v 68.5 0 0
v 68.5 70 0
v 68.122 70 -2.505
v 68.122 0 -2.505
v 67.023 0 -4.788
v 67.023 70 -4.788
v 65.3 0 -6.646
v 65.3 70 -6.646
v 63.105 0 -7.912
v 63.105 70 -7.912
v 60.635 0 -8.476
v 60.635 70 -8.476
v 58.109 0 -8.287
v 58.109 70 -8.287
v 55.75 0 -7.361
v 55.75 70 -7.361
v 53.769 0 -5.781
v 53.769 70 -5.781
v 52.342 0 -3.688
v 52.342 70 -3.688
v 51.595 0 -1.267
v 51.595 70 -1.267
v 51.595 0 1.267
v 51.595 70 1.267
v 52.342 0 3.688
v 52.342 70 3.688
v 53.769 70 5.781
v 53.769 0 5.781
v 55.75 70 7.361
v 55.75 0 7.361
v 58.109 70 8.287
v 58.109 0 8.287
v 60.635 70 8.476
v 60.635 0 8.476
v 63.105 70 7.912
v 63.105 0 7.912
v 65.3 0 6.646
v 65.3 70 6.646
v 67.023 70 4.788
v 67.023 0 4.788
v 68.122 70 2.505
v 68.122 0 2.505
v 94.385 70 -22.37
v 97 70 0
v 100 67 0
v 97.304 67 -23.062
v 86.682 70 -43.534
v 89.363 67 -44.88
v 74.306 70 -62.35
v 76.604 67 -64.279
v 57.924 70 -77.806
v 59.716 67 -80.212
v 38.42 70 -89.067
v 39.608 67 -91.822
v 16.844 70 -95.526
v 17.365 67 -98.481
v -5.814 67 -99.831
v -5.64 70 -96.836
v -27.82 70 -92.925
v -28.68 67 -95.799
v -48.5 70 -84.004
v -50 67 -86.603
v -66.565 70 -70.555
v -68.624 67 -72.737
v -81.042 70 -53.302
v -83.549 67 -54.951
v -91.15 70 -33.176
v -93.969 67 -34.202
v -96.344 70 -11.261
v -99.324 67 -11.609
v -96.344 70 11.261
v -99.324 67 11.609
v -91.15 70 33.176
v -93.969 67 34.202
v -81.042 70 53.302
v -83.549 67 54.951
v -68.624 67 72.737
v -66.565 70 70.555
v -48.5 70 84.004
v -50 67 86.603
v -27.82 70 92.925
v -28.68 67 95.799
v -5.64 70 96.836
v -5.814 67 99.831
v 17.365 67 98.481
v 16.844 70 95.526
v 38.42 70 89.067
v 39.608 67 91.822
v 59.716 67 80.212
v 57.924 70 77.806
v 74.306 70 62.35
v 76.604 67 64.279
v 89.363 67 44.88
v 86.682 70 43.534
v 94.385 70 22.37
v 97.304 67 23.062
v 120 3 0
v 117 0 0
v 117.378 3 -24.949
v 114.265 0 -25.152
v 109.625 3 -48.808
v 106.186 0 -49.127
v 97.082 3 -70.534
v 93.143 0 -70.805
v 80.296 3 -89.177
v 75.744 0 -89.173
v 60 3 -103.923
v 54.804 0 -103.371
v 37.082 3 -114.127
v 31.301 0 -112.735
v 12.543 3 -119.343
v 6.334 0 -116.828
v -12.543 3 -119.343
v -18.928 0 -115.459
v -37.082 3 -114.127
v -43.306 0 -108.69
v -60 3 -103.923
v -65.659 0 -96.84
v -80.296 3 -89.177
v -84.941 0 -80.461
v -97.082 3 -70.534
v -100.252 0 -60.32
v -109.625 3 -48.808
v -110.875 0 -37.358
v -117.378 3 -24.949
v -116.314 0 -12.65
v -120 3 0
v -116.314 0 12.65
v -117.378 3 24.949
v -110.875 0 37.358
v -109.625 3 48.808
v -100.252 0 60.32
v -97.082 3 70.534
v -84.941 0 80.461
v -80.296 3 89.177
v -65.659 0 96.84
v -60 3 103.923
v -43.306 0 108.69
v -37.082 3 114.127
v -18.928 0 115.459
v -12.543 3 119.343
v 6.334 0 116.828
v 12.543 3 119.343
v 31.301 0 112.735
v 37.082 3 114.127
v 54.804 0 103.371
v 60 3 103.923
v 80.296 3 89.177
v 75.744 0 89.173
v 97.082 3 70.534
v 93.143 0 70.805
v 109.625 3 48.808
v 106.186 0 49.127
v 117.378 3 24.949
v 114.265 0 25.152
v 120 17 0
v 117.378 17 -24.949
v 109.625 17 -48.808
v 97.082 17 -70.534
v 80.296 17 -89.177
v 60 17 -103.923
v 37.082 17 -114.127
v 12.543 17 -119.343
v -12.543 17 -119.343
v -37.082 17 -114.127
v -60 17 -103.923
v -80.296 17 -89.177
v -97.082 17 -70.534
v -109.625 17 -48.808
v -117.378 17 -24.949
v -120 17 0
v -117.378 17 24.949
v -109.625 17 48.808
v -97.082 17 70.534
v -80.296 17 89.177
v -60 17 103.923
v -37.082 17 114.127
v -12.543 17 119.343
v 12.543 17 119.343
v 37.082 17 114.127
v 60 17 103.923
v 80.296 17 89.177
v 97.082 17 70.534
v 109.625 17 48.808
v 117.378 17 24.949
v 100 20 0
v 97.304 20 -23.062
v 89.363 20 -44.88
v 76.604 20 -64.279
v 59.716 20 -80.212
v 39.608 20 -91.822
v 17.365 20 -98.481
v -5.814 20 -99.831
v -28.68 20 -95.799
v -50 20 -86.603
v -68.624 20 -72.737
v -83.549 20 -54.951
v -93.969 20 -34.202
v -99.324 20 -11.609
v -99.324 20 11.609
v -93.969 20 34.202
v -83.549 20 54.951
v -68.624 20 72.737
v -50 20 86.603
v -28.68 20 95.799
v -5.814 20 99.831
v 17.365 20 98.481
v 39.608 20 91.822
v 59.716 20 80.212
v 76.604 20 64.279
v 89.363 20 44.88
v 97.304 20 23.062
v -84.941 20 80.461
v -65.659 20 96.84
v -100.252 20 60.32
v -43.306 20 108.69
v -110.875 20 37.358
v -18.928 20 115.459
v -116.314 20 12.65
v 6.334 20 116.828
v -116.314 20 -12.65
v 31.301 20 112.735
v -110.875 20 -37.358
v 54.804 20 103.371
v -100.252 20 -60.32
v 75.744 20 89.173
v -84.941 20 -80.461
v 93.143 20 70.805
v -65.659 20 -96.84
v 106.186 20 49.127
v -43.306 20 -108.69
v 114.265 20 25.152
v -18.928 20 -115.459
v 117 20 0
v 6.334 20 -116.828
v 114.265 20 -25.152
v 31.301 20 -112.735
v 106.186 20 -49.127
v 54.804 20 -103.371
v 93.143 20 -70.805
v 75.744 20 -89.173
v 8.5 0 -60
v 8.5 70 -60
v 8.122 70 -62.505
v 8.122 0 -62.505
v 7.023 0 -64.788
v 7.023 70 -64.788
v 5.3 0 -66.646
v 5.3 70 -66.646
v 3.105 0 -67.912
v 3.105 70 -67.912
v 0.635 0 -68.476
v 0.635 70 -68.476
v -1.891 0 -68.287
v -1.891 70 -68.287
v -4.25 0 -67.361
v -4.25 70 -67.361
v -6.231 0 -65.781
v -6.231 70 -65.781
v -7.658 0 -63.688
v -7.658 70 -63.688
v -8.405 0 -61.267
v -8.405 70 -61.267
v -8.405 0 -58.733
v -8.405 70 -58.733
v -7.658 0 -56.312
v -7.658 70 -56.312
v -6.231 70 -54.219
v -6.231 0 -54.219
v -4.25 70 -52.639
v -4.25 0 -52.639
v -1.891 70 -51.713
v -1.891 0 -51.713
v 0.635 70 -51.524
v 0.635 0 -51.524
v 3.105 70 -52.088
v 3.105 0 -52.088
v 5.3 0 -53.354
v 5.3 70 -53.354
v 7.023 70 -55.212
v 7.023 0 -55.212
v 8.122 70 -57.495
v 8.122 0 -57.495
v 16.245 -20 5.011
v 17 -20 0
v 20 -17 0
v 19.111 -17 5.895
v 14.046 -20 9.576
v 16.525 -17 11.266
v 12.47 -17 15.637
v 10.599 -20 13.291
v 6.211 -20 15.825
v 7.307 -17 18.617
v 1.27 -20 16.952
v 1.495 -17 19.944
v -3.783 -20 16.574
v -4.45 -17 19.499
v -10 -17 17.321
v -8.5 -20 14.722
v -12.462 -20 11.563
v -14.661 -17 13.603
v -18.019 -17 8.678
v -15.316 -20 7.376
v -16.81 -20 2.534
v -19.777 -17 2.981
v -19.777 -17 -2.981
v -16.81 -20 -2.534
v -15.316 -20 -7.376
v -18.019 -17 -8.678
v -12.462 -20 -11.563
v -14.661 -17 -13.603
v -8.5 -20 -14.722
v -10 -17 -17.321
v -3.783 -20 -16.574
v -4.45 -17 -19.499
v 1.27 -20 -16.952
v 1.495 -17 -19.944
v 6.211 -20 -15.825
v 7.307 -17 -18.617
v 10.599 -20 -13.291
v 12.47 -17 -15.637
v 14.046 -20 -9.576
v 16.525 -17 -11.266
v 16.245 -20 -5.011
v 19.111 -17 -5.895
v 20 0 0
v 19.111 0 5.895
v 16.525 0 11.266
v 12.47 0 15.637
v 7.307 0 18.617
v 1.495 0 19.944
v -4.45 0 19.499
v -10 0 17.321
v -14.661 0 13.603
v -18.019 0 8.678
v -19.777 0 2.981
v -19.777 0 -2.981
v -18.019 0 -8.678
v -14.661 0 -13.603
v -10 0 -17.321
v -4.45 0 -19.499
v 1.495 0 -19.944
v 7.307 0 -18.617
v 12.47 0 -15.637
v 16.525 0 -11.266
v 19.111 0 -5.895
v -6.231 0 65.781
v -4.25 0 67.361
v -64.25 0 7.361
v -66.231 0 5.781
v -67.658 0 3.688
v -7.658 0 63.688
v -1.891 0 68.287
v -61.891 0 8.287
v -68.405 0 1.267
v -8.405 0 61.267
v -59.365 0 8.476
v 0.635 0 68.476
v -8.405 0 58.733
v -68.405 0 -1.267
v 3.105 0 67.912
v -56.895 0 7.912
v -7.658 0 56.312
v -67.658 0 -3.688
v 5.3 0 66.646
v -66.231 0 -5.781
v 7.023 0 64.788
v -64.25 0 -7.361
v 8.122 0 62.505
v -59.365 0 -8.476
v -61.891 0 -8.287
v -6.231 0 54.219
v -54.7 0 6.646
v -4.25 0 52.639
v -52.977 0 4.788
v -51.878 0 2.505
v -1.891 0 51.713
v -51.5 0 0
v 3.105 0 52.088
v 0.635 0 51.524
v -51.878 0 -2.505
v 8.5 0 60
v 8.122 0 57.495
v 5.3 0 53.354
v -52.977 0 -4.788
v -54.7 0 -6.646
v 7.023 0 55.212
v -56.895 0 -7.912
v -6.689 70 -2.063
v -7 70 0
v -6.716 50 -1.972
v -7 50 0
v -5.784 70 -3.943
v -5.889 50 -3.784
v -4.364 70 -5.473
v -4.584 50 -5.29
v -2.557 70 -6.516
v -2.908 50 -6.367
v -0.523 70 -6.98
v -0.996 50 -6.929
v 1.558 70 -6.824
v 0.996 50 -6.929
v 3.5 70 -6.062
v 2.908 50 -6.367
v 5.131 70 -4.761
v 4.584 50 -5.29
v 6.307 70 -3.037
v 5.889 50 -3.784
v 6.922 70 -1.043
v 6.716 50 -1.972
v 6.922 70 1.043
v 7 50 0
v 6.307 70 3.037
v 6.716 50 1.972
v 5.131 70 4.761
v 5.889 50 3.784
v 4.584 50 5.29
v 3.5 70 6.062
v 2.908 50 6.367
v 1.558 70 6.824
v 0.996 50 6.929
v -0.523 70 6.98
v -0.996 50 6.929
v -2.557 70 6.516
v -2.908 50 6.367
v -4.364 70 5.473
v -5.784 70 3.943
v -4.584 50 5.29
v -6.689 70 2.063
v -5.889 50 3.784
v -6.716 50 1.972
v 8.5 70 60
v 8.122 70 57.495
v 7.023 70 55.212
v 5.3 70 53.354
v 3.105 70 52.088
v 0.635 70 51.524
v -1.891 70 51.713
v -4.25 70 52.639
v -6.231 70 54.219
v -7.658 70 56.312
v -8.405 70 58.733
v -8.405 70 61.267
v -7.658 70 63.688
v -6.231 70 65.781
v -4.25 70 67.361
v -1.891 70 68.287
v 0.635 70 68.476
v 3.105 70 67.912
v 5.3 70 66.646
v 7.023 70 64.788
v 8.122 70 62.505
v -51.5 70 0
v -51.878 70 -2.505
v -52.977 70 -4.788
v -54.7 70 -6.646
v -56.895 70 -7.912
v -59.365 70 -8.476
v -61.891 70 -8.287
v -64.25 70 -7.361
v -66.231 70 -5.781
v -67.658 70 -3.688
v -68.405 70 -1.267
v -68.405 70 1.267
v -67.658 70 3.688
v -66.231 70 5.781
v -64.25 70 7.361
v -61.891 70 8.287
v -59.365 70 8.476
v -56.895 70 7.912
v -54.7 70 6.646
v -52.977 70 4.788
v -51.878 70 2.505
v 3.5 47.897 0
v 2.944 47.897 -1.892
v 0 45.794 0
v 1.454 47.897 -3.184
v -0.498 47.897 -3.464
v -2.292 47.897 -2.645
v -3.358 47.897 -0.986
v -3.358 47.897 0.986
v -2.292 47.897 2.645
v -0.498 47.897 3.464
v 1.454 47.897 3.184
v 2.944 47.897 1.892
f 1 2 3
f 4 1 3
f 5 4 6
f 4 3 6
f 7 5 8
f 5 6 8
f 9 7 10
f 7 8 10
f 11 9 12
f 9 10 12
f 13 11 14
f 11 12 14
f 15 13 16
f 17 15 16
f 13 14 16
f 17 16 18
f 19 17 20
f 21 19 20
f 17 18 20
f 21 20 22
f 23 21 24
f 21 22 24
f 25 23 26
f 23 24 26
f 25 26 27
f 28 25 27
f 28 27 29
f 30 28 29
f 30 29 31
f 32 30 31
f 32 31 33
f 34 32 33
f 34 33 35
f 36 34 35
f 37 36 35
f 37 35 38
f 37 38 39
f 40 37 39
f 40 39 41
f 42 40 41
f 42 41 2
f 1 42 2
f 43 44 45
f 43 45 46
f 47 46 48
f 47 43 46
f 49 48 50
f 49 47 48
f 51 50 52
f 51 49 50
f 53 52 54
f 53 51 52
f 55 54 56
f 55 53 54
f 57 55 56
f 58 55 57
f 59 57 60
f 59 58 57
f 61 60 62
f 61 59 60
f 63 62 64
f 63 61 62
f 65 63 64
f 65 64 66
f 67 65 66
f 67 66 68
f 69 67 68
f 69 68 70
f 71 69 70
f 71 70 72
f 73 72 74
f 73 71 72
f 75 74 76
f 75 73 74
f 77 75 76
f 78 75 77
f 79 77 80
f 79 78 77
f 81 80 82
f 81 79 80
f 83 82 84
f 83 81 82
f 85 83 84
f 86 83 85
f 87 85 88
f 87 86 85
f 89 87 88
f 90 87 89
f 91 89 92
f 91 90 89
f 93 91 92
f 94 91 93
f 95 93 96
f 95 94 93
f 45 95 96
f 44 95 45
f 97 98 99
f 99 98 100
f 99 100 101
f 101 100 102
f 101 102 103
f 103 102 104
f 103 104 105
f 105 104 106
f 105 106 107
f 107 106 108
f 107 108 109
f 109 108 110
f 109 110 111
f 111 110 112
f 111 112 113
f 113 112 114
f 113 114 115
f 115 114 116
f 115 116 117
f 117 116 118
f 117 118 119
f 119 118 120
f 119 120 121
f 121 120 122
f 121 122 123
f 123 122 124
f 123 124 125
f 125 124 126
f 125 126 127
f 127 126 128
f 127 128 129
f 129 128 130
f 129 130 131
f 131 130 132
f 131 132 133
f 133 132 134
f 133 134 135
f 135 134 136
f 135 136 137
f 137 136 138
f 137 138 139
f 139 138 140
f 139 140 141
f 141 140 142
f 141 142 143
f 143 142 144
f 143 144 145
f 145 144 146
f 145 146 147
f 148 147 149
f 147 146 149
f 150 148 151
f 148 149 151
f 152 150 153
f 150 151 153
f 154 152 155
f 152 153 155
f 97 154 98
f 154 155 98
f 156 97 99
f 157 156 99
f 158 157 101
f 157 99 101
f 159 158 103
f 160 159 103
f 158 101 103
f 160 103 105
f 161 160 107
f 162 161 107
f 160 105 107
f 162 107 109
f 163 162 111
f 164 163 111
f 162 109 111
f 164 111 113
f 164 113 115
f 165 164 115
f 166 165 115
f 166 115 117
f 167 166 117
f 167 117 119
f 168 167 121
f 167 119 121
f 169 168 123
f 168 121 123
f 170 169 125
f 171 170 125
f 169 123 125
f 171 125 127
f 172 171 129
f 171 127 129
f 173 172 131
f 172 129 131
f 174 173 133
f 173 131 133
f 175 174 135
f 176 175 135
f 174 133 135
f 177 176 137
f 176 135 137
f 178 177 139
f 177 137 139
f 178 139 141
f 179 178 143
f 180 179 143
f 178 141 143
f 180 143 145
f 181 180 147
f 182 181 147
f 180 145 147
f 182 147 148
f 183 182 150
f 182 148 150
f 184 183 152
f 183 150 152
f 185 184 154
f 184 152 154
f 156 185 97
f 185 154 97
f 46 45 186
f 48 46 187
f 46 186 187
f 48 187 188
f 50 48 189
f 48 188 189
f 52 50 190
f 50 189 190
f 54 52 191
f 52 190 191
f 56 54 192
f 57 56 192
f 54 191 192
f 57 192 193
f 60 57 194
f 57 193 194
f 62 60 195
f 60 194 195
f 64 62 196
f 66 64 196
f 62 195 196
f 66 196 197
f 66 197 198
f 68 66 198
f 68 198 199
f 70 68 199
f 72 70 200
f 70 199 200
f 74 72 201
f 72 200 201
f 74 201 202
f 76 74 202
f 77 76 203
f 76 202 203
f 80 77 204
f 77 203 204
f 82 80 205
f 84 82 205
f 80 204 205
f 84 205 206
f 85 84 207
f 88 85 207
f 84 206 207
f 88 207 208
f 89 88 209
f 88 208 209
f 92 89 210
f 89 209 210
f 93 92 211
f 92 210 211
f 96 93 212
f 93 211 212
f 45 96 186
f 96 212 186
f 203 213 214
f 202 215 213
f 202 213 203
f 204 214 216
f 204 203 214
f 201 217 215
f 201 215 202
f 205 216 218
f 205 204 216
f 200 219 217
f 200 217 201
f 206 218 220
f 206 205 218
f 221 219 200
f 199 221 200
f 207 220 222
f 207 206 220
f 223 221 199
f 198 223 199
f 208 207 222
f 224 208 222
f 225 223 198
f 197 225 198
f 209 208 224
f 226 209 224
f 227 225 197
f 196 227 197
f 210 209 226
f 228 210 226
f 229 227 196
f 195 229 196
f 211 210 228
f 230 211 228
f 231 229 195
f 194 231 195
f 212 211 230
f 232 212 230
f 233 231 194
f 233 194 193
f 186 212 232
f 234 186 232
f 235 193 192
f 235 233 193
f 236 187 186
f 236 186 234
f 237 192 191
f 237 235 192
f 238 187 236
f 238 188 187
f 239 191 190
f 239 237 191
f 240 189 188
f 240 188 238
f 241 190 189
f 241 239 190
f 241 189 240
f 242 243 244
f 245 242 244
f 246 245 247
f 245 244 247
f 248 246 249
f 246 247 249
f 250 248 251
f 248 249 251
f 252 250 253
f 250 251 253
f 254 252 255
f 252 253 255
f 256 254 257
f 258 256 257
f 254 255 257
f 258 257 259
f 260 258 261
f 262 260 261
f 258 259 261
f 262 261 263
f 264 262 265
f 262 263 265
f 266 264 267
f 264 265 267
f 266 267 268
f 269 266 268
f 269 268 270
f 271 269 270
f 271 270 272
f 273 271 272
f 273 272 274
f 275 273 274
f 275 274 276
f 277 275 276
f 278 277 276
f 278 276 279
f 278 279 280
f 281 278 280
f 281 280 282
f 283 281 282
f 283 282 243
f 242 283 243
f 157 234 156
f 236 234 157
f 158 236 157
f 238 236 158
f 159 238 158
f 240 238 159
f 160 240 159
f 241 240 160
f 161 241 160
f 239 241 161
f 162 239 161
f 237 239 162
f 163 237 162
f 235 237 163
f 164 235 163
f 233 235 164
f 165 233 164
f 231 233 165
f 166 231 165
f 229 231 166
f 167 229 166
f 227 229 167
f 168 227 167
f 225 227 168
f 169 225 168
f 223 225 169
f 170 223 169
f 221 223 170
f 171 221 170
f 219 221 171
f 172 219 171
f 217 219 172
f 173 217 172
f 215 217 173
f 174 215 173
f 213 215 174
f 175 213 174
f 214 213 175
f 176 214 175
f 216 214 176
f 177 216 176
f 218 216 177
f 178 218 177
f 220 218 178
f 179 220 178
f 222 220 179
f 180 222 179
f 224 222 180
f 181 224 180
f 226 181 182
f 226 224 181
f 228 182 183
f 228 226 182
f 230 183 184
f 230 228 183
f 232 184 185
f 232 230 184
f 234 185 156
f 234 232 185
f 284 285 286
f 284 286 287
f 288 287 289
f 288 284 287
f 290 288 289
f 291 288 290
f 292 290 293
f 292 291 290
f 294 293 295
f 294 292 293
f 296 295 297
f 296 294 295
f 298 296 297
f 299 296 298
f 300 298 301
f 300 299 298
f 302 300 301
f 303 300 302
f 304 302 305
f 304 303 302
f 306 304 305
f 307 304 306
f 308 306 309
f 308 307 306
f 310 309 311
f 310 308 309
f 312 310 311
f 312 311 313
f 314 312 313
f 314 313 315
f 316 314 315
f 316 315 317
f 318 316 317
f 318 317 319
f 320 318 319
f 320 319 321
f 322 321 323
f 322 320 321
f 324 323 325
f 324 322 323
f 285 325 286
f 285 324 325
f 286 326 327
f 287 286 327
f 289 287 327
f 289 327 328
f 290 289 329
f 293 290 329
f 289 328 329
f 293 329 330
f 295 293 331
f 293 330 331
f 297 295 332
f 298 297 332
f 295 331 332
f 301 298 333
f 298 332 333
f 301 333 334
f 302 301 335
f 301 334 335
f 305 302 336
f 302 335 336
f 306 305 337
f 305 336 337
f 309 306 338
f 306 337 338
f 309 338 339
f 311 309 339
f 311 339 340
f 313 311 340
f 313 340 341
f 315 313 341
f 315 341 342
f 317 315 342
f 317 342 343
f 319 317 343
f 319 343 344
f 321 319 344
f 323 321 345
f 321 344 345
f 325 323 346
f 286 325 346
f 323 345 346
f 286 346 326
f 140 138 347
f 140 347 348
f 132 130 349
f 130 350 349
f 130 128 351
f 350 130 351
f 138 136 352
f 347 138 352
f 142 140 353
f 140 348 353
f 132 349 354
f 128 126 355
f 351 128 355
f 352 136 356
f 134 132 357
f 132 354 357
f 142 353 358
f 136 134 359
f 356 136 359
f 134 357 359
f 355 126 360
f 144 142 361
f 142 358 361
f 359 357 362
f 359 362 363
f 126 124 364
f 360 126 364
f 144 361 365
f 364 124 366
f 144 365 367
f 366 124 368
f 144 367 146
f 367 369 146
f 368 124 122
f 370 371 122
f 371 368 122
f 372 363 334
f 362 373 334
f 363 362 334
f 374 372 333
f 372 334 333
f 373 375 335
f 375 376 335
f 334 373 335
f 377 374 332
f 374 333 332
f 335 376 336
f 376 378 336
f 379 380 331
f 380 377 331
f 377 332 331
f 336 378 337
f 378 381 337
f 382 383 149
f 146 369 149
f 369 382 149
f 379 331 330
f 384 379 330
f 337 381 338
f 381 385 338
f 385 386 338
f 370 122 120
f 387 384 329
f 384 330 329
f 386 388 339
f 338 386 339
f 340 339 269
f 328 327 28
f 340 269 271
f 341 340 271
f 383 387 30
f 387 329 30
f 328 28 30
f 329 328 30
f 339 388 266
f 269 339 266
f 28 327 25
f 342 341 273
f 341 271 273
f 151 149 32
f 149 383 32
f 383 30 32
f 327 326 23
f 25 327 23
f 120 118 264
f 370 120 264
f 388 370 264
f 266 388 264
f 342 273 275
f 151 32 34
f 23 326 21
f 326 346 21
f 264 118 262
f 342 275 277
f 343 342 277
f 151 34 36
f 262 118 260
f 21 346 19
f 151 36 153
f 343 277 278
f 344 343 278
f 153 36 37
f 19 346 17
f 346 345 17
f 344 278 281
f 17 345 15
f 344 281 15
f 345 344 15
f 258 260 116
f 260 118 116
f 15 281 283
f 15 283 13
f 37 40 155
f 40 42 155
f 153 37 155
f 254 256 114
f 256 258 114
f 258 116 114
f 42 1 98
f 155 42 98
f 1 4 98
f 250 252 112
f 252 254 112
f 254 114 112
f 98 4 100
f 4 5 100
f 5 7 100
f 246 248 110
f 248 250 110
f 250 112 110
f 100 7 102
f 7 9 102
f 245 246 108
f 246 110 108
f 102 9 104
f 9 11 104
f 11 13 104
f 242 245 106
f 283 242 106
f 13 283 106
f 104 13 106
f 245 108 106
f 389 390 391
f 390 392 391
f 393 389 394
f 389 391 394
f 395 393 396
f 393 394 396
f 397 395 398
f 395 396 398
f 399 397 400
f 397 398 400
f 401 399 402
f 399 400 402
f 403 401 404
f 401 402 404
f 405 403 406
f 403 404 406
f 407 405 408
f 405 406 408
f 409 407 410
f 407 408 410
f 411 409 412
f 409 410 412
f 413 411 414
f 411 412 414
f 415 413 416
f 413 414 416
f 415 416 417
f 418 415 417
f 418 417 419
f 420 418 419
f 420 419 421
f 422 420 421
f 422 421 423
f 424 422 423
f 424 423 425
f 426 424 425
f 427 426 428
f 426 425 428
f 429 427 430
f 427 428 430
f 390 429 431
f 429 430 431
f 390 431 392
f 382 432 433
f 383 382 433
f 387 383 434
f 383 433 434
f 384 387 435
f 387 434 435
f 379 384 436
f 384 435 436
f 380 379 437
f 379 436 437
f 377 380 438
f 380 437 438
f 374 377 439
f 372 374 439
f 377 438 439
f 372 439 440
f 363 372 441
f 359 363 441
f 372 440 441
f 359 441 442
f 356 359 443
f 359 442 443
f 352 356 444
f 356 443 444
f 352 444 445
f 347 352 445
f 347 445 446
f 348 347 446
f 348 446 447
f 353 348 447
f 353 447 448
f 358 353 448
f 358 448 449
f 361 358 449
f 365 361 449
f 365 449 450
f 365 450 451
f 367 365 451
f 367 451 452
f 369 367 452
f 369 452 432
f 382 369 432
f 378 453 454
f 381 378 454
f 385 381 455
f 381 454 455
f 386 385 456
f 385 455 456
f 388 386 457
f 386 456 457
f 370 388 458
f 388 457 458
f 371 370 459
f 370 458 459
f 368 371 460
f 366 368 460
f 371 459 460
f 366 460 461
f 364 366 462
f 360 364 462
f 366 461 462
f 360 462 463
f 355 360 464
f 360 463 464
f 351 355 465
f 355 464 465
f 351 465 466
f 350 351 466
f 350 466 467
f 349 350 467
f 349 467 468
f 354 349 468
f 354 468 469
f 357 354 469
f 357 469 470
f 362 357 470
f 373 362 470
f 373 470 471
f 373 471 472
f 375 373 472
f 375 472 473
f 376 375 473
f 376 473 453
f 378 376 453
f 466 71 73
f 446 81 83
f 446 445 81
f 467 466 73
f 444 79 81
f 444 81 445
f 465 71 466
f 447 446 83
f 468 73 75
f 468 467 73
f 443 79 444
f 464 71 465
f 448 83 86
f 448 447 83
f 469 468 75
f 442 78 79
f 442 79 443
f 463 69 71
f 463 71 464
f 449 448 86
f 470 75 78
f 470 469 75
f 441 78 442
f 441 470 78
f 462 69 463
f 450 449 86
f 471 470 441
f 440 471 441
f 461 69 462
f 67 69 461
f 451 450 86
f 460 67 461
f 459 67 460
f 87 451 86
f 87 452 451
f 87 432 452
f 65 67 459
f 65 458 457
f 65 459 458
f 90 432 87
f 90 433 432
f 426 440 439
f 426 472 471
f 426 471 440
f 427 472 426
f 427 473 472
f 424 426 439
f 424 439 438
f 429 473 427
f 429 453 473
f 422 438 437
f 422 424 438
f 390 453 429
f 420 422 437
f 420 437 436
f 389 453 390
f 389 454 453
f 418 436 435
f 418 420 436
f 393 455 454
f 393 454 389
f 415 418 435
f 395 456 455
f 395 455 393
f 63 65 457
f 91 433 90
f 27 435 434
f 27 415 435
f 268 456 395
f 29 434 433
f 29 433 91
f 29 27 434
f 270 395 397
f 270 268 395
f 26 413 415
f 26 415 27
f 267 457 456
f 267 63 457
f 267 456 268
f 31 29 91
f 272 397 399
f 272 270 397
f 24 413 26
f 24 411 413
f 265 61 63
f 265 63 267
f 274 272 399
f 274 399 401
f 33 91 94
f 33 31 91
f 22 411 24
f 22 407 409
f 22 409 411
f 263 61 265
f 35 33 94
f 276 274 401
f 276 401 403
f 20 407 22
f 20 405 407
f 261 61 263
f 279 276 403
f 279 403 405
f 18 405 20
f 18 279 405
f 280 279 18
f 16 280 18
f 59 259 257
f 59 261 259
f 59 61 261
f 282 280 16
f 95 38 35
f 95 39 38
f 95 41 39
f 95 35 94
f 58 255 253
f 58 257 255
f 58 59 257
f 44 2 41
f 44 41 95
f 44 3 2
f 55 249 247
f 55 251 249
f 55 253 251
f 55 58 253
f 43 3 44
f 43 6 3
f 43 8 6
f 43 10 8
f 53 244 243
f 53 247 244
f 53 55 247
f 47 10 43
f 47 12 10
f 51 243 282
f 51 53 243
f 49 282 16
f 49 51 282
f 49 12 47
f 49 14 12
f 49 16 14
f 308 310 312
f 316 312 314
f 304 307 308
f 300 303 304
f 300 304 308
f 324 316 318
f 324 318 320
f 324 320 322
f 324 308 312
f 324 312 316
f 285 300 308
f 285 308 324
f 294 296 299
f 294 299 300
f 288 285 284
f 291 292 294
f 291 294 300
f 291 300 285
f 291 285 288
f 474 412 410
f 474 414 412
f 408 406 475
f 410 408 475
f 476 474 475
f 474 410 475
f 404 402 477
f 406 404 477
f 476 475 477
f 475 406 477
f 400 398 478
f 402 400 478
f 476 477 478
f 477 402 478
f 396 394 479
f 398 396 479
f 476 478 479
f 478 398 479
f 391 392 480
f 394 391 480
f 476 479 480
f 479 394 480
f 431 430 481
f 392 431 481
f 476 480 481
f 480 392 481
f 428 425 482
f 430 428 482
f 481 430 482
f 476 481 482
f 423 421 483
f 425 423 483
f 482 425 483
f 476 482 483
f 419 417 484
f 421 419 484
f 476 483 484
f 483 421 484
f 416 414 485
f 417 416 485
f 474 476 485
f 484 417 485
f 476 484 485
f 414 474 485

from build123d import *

# Parameters (mm, degrees)
SKETCH_1_R             = 120
EXTRUDE_1_DEPTH        = 20
SKETCH_2_R             = 100
EXTRUDE_2_DEPTH        = 50
SKETCH_3_R             = 8.5
CUT_EXTRUDE_1_DEPTH    = 80
SKETCH_4_R             = 20
EXTRUDE_3_DEPTH        = 20
HOLE_WIZARD_M161_D     = 14
HOLE_WIZARD_M161_DEPTH = 20
HOLE_WIZARD_M161_TIP   = 4.206024333
CHAMFER_1_SIZE         = 3
CHAMFER_2_SIZE         = 3


with BuildPart() as part:
    # Эскиз1 → Бобышка-Вытянуть1 (new body)
    with BuildSketch(Plane(origin=(0, 0, 0), x_dir=(1, 0, 0), z_dir=(0, 1, 0))):
        Circle(SKETCH_1_R)
    extrude(amount=EXTRUDE_1_DEPTH)

    # Эскиз2 → Бобышка-Вытянуть2 (add)
    with BuildSketch(Plane(origin=(0, 20, 0), x_dir=(1, 0, 0), z_dir=(0, 1, 0))):
        Circle(SKETCH_2_R)
    extrude(amount=EXTRUDE_2_DEPTH)

    # Эскиз3 → Вырез-Вытянуть1 (cut)
    with BuildSketch(Plane(origin=(0, 70, 0), x_dir=(1, 0, 0), z_dir=(0, 1, 0))):
        with Locations((0, 60)):
            Circle(SKETCH_3_R)
        with Locations((60, 0)):
            Circle(SKETCH_3_R)
        with Locations((0, -60)):
            Circle(SKETCH_3_R)
        with Locations((-60, 0)):
            Circle(SKETCH_3_R)
    extrude(amount=-CUT_EXTRUDE_1_DEPTH, mode=Mode.SUBTRACT)

    # Эскиз4 → Бобышка-Вытянуть3 (add)
    with BuildSketch(Plane.XZ):
        Circle(SKETCH_4_R)
    extrude(amount=EXTRUDE_3_DEPTH)

    # Отверстие обработанное метчиком M161
    with Locations(Plane(origin=(0, 70, 0), x_dir=(1, 0, 0), z_dir=(0, 1, 0))):
        with Locations((0, 0)):
            Hole(HOLE_WIZARD_M161_D / 2, depth=HOLE_WIZARD_M161_DEPTH)
            with Locations((0, 0, -(HOLE_WIZARD_M161_DEPTH + HOLE_WIZARD_M161_TIP / 2))):  # 118° drill point
                Cone(0, HOLE_WIZARD_M161_D / 2, HOLE_WIZARD_M161_TIP, mode=Mode.SUBTRACT)

    # Фаска1
    chamfer_1_edges = [part.edges().sort_by_distance(p)[0] for p in [
        (-120, 0, 0),
        (-120, 20, 0),
        (-100, 70, 0),
    ]]
    chamfer(chamfer_1_edges, length=CHAMFER_1_SIZE)

    # Фаска2
    chamfer_2_edges = [part.edges().sort_by_distance(p)[0] for p in [
        (-20, -20, 0),
    ]]
    chamfer(chamfer_2_edges, length=CHAMFER_2_SIZE)


solid = part.part
